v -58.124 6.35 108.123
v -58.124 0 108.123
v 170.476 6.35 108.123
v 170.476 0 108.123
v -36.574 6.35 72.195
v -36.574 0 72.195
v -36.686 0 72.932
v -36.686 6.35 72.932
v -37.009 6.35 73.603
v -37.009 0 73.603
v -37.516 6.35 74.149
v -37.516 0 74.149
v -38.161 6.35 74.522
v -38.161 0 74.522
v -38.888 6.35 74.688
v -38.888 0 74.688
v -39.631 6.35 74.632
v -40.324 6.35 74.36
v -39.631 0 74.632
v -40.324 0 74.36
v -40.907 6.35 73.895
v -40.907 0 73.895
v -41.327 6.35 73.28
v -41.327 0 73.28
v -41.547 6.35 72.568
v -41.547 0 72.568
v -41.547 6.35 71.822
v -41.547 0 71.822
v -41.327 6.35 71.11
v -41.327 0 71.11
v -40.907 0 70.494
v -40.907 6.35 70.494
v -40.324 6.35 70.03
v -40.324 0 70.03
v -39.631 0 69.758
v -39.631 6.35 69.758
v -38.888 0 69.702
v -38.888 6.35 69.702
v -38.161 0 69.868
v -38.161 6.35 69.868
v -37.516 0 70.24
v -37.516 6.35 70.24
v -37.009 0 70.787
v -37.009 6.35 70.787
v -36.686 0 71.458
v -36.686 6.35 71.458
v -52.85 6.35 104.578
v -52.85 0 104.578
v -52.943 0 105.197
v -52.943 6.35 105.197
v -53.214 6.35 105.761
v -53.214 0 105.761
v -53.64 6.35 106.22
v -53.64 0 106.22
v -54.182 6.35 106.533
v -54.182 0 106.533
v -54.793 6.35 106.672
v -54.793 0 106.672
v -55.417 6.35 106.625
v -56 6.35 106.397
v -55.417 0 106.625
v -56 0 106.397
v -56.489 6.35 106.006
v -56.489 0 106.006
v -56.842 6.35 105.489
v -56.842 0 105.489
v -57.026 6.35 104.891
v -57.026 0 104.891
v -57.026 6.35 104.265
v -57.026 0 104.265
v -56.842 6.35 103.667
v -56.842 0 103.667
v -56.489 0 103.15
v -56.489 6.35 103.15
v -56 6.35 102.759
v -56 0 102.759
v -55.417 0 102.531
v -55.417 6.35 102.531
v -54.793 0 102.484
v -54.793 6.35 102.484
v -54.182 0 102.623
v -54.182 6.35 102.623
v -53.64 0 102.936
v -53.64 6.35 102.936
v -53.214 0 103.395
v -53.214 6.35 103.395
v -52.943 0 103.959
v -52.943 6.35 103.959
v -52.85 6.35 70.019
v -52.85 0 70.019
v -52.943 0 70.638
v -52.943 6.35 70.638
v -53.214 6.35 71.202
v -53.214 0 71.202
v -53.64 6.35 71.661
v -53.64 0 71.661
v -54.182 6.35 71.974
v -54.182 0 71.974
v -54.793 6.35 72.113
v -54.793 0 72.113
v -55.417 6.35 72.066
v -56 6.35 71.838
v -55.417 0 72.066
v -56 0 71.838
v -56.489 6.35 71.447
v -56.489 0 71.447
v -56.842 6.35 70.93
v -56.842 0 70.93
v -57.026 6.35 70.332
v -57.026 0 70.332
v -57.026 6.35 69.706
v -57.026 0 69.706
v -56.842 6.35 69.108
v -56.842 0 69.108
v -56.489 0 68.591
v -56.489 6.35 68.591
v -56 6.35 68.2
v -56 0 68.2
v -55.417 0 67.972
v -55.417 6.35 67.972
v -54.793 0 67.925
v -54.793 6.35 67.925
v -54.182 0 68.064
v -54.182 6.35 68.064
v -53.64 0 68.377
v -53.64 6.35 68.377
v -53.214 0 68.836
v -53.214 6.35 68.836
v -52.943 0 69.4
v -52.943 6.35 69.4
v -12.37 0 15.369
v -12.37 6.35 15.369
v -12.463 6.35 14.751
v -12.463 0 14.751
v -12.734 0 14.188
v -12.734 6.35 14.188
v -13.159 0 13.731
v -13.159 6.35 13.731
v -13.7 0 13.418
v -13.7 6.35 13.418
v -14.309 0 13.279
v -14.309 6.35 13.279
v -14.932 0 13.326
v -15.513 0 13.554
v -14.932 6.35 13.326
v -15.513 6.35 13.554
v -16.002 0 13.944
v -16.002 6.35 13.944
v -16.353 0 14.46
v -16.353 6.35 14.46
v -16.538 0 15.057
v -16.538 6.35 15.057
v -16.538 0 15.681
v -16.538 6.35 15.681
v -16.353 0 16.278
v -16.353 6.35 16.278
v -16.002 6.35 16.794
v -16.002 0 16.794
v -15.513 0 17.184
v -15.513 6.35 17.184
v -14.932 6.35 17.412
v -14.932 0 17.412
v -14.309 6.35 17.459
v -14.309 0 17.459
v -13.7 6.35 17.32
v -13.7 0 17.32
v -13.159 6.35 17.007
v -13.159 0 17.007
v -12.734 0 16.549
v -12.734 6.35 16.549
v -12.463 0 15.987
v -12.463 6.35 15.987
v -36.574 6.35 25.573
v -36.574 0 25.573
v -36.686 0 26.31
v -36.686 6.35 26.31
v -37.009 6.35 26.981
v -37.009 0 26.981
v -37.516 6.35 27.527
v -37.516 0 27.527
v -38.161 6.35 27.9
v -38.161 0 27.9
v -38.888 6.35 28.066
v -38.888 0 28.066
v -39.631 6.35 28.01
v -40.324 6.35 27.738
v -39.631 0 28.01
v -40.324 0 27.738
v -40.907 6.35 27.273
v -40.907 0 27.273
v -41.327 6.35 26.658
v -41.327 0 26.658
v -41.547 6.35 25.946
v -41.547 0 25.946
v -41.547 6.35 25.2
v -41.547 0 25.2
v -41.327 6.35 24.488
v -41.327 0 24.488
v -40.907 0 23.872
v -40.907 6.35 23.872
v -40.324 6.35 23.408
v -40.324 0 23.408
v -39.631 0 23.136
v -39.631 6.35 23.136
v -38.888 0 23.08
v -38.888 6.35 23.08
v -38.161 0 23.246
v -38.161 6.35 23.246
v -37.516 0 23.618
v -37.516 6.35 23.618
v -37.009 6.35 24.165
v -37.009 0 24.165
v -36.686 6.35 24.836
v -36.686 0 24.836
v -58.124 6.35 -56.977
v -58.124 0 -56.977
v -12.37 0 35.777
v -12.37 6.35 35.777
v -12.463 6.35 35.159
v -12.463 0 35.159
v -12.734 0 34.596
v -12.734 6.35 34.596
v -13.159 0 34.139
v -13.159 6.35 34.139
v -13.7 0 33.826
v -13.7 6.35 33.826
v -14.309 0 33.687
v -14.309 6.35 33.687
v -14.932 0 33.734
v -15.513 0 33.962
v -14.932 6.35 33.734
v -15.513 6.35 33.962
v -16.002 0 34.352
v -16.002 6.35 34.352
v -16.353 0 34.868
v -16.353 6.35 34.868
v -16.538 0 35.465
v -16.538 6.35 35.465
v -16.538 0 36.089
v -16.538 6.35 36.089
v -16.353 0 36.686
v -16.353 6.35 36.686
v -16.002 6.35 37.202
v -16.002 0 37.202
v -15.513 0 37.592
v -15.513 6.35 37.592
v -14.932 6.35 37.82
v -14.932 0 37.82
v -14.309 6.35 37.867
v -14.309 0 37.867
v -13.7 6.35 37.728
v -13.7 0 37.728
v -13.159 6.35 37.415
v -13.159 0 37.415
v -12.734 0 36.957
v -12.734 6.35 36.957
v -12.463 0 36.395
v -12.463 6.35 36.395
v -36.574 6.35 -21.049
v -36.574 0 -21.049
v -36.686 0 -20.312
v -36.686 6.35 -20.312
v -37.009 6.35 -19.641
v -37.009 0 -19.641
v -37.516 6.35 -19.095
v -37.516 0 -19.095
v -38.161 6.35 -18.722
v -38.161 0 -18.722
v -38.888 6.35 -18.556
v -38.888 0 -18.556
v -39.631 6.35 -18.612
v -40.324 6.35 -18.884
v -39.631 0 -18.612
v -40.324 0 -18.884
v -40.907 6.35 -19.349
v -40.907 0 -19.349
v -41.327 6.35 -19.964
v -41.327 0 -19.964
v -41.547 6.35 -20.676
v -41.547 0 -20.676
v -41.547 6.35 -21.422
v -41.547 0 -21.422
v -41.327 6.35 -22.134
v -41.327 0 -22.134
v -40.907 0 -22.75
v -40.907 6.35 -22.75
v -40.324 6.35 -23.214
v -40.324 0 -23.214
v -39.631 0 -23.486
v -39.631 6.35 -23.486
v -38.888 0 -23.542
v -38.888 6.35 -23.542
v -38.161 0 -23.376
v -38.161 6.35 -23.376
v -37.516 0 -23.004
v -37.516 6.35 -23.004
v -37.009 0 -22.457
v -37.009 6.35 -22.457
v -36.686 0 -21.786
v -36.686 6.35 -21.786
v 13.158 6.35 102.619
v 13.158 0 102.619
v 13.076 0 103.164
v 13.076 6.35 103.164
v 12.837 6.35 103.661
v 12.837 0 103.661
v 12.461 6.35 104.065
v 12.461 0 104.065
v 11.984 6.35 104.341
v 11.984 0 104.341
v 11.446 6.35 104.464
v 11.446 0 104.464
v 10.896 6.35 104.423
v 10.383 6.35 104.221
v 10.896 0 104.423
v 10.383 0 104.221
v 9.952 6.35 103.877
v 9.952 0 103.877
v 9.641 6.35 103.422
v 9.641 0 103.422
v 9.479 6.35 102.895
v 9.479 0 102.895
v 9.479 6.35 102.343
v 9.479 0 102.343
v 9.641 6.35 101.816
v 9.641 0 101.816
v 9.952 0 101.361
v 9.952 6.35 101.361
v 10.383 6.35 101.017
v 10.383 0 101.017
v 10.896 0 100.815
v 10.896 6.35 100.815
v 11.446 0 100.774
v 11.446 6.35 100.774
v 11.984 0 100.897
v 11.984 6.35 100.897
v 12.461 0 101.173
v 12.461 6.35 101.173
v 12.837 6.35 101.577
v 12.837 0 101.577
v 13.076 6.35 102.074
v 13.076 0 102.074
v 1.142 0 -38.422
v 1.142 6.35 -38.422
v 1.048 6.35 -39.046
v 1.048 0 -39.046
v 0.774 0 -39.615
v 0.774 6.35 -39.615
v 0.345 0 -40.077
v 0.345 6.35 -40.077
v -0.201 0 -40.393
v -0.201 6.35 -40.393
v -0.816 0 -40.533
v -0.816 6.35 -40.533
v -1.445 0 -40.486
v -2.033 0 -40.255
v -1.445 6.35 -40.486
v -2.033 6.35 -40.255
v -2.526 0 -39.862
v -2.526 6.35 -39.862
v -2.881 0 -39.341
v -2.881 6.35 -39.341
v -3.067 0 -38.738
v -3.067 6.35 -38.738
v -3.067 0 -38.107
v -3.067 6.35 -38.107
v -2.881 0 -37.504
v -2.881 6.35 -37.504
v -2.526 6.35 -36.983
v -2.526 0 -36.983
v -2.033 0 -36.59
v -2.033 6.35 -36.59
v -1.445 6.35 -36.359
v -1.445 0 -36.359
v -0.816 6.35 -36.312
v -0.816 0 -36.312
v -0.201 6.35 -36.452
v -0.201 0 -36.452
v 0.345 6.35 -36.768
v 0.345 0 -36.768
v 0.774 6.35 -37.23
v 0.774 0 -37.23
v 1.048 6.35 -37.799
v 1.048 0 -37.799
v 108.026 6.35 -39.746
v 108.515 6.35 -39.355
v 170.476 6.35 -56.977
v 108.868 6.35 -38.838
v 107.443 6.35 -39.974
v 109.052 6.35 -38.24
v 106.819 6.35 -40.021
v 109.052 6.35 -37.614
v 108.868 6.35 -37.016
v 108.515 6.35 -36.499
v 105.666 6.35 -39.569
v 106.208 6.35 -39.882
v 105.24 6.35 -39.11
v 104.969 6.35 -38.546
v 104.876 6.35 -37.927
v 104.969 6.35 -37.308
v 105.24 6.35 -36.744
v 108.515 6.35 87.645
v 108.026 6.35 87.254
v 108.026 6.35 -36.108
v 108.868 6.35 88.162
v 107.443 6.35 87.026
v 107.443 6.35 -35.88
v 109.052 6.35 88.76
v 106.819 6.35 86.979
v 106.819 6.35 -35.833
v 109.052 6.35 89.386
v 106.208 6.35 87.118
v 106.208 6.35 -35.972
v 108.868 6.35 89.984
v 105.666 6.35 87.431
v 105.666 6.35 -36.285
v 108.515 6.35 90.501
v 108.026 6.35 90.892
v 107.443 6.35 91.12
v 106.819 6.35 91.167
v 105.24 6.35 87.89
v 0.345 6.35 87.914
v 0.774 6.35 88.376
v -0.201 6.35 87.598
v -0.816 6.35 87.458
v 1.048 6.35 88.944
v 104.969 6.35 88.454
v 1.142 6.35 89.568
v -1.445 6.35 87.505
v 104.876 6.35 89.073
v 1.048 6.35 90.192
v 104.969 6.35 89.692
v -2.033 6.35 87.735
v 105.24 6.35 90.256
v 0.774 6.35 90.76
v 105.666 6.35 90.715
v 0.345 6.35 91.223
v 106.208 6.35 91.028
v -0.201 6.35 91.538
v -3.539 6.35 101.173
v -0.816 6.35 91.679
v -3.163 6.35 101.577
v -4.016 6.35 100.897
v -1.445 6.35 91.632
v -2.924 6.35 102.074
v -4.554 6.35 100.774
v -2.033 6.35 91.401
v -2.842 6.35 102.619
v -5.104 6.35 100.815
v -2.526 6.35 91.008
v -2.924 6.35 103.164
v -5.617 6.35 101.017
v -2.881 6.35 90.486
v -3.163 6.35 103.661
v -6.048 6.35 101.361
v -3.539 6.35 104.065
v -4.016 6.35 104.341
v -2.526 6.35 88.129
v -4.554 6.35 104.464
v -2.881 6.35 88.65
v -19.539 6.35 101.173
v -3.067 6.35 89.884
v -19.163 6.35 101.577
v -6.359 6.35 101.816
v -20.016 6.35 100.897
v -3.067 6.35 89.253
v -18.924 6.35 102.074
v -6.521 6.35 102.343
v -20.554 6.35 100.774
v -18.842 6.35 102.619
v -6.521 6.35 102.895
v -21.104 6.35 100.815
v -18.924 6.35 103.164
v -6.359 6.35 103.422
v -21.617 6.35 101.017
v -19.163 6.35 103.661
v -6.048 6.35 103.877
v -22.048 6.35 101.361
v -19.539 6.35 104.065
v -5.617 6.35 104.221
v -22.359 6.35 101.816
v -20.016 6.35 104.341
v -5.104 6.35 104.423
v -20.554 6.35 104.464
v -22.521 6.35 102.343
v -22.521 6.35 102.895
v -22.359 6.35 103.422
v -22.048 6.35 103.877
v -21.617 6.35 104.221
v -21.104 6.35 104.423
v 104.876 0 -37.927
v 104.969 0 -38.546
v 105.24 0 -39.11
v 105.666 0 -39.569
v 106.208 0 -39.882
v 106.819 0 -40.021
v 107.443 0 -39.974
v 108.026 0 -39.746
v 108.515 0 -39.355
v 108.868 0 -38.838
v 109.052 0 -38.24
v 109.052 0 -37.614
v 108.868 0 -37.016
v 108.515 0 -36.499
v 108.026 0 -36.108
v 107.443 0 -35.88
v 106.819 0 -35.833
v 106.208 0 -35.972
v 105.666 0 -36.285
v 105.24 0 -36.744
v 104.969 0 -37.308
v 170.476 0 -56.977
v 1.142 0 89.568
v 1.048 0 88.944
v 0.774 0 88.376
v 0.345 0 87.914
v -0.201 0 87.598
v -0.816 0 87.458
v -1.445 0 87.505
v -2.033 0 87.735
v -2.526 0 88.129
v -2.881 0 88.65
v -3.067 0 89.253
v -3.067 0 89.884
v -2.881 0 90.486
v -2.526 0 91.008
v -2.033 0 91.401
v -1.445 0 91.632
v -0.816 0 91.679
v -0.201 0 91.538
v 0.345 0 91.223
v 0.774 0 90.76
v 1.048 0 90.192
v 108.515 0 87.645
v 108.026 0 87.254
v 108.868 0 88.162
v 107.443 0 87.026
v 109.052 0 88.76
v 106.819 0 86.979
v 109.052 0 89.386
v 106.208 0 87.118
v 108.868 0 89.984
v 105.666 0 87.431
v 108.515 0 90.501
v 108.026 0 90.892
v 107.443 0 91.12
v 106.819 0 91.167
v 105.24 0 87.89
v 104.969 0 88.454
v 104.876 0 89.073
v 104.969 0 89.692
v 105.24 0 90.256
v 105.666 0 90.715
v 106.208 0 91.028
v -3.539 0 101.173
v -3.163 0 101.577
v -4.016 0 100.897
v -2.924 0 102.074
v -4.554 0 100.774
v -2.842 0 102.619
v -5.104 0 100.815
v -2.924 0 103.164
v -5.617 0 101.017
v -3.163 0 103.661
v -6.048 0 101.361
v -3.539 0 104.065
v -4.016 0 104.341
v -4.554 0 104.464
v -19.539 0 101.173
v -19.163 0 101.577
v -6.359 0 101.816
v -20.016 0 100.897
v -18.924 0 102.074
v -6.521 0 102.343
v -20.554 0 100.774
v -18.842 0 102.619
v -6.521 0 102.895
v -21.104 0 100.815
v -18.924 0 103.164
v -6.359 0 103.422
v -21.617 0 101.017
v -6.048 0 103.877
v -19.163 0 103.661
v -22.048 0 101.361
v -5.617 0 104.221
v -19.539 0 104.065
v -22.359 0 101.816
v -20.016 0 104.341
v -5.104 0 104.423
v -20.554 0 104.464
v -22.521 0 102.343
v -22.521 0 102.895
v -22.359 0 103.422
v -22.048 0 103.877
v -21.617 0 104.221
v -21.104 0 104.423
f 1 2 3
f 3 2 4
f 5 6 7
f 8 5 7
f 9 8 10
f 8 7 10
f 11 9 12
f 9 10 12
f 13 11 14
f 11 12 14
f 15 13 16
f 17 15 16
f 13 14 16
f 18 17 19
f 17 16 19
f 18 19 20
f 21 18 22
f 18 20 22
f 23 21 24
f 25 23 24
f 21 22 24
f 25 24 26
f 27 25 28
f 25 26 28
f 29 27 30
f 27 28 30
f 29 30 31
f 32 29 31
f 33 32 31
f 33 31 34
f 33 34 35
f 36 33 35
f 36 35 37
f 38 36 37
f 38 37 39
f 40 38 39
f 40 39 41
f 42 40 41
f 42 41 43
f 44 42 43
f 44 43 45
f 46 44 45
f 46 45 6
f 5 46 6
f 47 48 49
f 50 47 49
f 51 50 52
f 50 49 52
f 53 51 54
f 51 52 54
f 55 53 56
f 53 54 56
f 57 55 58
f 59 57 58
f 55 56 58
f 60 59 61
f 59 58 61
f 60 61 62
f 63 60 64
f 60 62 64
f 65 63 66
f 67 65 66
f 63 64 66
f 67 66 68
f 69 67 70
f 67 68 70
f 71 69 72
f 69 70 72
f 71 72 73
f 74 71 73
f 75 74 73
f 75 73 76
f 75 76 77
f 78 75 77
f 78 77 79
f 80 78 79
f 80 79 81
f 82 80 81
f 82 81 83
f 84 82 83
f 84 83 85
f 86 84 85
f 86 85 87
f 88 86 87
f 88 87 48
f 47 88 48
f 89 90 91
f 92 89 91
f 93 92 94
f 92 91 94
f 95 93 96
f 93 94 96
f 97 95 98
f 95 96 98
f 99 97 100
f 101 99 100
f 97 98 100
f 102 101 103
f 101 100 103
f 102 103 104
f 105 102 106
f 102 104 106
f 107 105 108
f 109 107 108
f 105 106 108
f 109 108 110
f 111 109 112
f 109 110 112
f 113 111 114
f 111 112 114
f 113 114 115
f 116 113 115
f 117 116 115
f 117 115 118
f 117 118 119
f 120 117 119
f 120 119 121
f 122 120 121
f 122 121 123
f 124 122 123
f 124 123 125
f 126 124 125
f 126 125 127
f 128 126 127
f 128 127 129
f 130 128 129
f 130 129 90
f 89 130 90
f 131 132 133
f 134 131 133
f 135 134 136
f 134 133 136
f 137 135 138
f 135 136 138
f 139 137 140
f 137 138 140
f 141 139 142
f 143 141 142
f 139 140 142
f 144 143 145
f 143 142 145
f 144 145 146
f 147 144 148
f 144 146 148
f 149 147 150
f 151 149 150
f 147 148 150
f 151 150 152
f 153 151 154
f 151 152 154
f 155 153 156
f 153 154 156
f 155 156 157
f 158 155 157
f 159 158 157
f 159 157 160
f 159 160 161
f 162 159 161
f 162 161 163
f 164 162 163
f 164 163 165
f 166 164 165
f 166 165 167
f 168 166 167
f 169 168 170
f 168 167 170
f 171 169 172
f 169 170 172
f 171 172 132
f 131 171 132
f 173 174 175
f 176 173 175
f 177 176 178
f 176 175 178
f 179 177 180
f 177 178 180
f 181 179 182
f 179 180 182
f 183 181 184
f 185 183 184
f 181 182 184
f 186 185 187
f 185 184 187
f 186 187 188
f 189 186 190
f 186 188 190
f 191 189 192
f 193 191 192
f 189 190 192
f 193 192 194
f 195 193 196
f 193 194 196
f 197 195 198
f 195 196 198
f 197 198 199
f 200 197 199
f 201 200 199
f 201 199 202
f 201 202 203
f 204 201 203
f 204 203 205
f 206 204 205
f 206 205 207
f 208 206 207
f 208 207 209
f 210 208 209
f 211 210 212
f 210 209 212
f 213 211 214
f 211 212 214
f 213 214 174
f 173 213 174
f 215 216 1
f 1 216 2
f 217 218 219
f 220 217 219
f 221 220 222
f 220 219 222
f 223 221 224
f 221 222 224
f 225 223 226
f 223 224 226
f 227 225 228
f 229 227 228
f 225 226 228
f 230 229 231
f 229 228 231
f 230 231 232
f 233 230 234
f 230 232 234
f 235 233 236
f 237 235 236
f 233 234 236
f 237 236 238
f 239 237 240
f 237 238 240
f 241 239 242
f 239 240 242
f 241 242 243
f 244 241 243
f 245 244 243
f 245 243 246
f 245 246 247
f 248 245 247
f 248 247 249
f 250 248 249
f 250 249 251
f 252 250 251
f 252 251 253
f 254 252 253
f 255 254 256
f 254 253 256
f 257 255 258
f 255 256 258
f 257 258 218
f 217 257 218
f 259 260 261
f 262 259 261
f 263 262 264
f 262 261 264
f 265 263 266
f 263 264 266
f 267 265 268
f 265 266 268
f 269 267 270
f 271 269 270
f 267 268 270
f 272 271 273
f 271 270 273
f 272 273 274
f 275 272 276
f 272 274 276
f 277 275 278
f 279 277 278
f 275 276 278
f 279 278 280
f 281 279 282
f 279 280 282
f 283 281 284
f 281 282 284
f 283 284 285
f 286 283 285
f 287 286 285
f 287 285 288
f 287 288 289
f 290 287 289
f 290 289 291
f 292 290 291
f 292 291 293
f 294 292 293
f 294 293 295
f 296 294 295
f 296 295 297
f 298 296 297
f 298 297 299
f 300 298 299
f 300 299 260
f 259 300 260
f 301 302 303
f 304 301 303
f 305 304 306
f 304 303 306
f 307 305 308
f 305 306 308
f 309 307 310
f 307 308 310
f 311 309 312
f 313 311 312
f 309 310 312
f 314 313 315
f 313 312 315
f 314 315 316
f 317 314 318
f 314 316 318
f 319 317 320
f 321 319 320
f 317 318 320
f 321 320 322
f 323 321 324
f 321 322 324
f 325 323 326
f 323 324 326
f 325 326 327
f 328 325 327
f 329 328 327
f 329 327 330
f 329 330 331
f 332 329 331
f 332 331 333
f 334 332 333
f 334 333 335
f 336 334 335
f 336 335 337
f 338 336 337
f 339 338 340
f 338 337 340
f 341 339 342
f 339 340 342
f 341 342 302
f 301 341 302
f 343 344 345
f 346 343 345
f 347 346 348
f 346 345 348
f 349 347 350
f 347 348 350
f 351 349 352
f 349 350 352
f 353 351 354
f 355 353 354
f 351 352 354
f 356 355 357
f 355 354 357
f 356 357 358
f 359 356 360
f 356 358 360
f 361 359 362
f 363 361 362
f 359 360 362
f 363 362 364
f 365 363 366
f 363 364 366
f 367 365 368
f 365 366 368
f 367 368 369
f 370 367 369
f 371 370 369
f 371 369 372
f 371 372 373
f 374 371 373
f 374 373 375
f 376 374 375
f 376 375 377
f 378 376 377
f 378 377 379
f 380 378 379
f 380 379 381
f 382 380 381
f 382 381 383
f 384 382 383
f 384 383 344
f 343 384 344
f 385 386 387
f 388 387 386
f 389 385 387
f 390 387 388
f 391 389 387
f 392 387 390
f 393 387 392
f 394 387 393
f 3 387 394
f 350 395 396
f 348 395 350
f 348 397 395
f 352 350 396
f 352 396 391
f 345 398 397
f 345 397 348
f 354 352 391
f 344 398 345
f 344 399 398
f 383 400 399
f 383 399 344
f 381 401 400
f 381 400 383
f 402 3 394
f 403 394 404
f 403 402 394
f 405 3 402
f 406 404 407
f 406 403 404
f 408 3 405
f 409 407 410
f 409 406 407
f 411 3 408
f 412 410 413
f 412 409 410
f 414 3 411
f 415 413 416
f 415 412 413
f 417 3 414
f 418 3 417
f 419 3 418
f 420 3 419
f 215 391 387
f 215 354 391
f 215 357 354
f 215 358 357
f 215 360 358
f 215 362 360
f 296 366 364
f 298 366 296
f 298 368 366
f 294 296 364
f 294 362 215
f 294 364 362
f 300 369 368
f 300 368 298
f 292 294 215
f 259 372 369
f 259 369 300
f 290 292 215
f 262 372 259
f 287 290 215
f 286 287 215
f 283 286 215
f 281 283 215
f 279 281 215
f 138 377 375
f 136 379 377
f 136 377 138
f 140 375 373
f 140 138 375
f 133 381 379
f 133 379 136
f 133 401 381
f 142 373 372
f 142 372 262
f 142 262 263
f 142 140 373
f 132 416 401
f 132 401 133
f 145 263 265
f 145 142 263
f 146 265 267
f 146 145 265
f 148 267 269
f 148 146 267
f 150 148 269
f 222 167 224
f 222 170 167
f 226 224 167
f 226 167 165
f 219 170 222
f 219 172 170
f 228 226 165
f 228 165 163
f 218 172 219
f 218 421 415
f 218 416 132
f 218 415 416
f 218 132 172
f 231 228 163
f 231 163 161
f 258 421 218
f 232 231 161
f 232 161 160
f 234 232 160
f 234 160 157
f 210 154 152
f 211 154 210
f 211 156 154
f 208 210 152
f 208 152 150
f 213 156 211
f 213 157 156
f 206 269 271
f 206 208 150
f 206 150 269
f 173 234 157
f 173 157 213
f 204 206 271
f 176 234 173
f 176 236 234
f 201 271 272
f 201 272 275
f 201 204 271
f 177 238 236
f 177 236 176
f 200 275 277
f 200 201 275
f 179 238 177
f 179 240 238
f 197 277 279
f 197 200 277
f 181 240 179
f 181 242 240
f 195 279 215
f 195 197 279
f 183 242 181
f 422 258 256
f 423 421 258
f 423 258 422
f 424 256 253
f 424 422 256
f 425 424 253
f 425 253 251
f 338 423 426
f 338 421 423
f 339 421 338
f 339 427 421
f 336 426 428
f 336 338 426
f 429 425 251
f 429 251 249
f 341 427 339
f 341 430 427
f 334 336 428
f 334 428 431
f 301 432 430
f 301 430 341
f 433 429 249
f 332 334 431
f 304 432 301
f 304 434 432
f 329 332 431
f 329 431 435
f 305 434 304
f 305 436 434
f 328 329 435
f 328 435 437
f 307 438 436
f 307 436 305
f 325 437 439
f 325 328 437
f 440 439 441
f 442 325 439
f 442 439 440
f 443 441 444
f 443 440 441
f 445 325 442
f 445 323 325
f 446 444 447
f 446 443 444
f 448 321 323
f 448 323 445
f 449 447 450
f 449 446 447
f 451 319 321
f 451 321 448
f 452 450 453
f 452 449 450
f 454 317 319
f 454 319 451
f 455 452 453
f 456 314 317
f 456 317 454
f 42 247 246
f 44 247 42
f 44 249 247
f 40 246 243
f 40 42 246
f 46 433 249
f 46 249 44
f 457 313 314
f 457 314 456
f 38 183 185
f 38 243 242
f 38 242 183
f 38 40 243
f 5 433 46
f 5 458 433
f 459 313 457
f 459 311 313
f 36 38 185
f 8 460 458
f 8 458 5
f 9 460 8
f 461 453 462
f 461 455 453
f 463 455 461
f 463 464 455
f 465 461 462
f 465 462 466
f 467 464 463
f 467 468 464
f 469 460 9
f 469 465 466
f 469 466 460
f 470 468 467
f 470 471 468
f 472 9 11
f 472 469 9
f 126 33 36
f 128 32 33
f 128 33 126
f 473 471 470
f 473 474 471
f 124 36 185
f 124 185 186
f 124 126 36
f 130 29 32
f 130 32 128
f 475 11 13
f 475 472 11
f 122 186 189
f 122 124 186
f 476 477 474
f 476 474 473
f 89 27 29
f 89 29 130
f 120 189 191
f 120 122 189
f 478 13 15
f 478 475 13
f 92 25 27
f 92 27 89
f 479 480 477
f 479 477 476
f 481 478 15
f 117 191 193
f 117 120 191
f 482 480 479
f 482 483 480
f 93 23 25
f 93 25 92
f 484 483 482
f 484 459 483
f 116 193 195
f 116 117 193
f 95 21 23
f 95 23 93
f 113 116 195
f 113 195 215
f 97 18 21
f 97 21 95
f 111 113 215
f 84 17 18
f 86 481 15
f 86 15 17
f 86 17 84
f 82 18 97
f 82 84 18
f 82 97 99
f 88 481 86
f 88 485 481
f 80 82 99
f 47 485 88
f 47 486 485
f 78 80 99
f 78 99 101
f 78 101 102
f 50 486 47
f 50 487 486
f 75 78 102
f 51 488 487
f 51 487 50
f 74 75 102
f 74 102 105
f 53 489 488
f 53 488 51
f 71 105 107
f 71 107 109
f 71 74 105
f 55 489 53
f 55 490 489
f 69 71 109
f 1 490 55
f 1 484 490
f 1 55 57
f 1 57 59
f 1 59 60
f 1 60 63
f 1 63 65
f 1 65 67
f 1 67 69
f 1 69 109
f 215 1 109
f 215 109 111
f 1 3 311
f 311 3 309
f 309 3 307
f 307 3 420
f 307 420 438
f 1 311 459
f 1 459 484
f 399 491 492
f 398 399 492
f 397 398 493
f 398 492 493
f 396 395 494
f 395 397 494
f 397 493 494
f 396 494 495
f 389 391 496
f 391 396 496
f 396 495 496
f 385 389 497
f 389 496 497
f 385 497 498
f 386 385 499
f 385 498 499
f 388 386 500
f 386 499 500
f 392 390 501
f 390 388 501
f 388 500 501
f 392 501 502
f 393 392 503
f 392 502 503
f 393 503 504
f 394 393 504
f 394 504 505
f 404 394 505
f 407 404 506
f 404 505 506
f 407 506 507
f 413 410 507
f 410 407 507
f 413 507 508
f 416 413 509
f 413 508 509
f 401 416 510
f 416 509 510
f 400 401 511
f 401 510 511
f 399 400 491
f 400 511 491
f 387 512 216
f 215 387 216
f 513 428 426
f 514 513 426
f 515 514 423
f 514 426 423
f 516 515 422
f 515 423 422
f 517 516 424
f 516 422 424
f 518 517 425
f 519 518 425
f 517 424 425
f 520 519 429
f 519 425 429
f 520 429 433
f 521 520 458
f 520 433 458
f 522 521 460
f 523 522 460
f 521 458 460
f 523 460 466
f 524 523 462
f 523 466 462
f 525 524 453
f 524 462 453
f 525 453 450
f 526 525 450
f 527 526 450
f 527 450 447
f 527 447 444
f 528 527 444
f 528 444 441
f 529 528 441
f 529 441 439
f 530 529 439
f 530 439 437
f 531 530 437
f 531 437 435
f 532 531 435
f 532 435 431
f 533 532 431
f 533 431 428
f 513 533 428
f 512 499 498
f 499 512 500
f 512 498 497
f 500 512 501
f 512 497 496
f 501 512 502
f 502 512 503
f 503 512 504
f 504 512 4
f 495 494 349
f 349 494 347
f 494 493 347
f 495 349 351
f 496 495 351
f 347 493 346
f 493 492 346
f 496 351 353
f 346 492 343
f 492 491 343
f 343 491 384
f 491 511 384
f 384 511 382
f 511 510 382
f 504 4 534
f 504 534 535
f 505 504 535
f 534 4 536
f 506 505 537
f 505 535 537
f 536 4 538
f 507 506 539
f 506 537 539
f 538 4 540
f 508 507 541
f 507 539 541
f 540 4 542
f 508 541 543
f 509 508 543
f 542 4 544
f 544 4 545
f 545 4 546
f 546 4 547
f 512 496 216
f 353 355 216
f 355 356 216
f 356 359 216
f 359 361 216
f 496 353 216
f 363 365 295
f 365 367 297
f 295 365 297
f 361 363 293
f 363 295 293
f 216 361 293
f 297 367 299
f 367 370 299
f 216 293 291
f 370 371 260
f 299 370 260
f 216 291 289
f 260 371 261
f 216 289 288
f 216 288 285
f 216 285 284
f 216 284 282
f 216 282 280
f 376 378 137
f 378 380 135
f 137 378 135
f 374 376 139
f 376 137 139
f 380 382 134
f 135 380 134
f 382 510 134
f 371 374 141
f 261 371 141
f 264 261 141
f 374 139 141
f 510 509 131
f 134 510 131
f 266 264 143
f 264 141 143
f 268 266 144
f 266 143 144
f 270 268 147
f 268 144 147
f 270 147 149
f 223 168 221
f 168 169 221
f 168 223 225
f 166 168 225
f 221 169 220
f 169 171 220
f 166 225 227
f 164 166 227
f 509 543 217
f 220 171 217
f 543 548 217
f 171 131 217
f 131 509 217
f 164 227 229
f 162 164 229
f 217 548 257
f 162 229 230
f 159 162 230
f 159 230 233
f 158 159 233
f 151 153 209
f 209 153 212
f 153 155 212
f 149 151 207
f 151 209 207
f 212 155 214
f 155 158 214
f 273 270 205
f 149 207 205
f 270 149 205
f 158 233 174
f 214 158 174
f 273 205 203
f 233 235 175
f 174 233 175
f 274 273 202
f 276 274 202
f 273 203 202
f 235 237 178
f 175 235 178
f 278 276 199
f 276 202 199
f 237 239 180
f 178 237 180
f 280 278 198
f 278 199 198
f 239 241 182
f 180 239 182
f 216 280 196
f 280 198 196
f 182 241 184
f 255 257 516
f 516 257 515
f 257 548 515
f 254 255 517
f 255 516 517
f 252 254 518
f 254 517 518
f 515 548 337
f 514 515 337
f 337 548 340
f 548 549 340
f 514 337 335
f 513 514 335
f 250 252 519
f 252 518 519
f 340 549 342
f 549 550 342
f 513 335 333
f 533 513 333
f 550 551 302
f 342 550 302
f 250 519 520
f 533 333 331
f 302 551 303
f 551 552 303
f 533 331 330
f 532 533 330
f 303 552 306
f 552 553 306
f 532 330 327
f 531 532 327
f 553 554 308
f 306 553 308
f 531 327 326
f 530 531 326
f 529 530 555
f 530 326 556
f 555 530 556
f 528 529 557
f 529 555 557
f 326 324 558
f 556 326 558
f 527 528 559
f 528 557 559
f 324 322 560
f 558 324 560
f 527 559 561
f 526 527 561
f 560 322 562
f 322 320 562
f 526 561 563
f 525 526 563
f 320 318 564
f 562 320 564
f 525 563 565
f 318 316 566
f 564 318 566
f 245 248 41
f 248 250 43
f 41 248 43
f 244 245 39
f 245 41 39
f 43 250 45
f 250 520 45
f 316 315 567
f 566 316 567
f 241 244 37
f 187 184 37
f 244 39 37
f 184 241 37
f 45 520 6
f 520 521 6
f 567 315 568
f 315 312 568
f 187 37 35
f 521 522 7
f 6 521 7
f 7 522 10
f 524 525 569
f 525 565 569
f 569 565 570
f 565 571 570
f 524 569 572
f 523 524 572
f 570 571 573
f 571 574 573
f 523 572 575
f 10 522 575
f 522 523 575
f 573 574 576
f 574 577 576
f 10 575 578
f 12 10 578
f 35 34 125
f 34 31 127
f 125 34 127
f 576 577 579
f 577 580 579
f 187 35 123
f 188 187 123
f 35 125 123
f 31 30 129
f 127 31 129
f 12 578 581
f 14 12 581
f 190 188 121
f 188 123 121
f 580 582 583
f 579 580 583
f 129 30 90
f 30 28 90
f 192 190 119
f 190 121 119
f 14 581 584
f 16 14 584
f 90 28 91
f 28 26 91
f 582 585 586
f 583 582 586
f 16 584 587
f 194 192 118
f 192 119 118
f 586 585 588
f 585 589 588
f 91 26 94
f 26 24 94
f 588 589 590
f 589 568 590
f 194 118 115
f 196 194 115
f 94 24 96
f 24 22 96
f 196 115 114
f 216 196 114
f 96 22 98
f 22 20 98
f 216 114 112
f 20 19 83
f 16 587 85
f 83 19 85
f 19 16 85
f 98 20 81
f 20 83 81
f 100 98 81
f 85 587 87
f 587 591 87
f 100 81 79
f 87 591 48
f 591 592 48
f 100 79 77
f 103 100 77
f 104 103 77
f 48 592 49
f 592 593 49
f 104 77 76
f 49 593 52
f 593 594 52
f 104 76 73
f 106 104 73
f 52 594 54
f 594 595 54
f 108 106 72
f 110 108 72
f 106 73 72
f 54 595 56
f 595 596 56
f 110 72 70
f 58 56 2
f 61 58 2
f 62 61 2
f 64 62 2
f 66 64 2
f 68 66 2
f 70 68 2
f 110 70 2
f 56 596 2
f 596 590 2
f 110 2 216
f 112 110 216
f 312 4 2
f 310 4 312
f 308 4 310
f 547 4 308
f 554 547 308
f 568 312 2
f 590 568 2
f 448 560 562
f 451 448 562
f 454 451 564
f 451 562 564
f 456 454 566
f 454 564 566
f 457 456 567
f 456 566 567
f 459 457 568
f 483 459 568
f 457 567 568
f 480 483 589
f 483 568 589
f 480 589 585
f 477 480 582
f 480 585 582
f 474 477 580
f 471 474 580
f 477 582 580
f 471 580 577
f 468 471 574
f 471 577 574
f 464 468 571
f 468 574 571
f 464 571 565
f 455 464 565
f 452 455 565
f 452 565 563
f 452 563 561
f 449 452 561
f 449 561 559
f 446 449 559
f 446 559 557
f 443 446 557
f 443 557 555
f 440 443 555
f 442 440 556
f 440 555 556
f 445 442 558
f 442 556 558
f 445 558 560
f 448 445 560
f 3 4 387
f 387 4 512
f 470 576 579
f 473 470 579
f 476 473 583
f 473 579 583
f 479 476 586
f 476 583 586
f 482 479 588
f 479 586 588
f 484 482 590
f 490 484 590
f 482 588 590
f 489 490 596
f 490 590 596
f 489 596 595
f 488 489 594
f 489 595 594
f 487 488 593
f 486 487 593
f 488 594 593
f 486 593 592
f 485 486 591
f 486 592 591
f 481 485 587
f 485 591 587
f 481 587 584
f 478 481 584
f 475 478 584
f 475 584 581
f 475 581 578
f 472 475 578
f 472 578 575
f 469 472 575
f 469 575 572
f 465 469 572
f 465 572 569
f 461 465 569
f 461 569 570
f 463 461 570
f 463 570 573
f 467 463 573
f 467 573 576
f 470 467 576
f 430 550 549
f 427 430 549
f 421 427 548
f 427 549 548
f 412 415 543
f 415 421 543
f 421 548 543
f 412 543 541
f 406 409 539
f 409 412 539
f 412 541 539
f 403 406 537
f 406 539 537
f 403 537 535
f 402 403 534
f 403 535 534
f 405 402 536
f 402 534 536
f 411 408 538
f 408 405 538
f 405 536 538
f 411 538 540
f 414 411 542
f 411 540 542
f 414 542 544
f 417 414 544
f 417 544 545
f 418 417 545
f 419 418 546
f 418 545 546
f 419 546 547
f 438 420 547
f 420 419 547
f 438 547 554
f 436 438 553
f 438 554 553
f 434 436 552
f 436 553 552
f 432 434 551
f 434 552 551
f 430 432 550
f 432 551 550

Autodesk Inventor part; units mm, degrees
ref_plane "YZ Plane" through (0, 0, 0) normal (1, 0, 0) x (0, 1, 0)
ref_plane "XZ Plane" through (0, 0, 0) normal (0, 1, 0) x (-1, 0, 0)
ref_plane "XY Plane" through (0, 0, 0) normal (0, 0, 1) x (1, 0, 0)
sketch "Sketch1" plane through (0, 0, 0) normal (0, 1, 0) x (-1, 0, 0)
  line L0 (58.1245, 108.1229) -> (-170.4755, 108.1229)
  line L1 (-170.4755, 108.1229) -> (-170.4755, -56.9771)
  line L2 (-170.4755, -56.9771) -> (58.1245, -56.9771)
  line L3 (58.1245, -56.9771) -> (58.1245, 108.1229)
  circle A0 centre (-106.9755, 89.0729) radius 2.1
  circle A1 centre (-106.9755, -37.9271) radius 2.1
extrude "Extrusion2" add sketch "Sketch1" along normal blind 6.35
sketch "Sketch2" plane through (0, 6.35, 0) normal (0, 1, 0) x (1, 0, 0)
  circle A0 centre (-0.9745, -89.5682) radius 2.1164
  circle A1 centre (-0.9745, 38.4224) radius 2.1164
  line L0 (-58.1245, 56.9771) -> (-58.1245, -108.1229) construction
  point P0 (0, 0)
  dimension "d19" = 127.9906
  dimension "d20" = 57.15
extrude "Extrusion3" cut sketch "Sketch2" against normal through all
sketch "Sketch3" plane through (0, 0, 0) normal (0, -1, 0) x (1, 0, 0)
  line L0 (-58.1245, 108.1229) -> (170.4755, 108.1229) construction
  line L1 (-58.1245, -56.9771) -> (-58.1245, 108.1229) construction
  line L2 (170.4755, -56.9771) -> (-58.1245, -56.9771) construction
  circle A0 centre (-39.0745, -21.0491) radius 2.5
  circle A1 centre (-39.0745, 72.1949) radius 2.5
  circle A2 centre (-39.0745, 25.5729) radius 2.5
  point P0 (0, 0)
  dimension "d21" = 5
  dimension "d22" = 5
  dimension "d24" = 165.1
  dimension "d25" = 35.928
  dimension "d28" = 19.05
  dimension "d34" = 35.928
extrude "Extrusion6" cut sketch "Sketch3" against normal through all
sketch "Sketch5" plane through (0, 6.35, 0) normal (0, 1, 0) x (1, 0, 0)
  line L0 (-58.1245, -108.1229) -> (170.4755, -108.1229) construction
  line L1 (170.4755, 56.9771) -> (-58.1245, 56.9771) construction
  line L2 (-58.1245, 56.9771) -> (-58.1245, -108.1229) construction
  circle A0 centre (-14.4655, -35.7769) radius 2.0955
  circle A1 centre (-14.4655, -15.3689) radius 2.0955
  line L3 (-8.4587, -93.3037) -> (-8.4587, -42.9623)
  point P0 (0, 0)
  dimension "d37" = 72.346
  dimension "d39" = 72.346
  dimension "d40" = 4.191
  dimension "d41" = 43.659
  dimension "d42" = 4.191
  dimension "d43" = 43.659
extrude "Extrusion7" cut sketch "Sketch5" against normal through all
sketch "Sketch6" plane through (0, 0, 0) normal (0, -1, 0) x (1, 0, 0)
  line L0 (-58.1245, 108.1229) -> (170.4755, 108.1229) construction
  circle A0 centre (-20.692, 102.6189) radius 1.85
  circle A1 centre (11.308, 102.6189) radius 1.85
  circle A2 centre (-4.692, 102.6189) radius 1.85
  point P0 (0, 0)
extrude "Extrusion8" cut sketch "Sketch6" against normal through all
sketch "Sketch8" plane through (0, 0, 0) normal (0, -1, 0) x (1, 0, 0)
  line L0 (-58.1245, 108.1229) -> (170.4755, 108.1229) construction
  line L1 (-58.1245, -56.9771) -> (-58.1245, 108.1229) construction
  circle A0 centre (-54.9495, 104.5779) radius 2.1
  circle A1 centre (-54.9495, 70.0189) radius 2.1
  point P0 (0, 0)
  dimension "d53" = 4.2
  dimension "d54" = 4.2
  dimension "d55" = 3.545
  dimension "d56" = 3.175
  dimension "d57" = 3.175
  dimension "d58" = 38.104
extrude "Extrusion9" cut sketch "Sketch8" against normal through all
properties part number "Plexiglass Hub Holding Plate"
